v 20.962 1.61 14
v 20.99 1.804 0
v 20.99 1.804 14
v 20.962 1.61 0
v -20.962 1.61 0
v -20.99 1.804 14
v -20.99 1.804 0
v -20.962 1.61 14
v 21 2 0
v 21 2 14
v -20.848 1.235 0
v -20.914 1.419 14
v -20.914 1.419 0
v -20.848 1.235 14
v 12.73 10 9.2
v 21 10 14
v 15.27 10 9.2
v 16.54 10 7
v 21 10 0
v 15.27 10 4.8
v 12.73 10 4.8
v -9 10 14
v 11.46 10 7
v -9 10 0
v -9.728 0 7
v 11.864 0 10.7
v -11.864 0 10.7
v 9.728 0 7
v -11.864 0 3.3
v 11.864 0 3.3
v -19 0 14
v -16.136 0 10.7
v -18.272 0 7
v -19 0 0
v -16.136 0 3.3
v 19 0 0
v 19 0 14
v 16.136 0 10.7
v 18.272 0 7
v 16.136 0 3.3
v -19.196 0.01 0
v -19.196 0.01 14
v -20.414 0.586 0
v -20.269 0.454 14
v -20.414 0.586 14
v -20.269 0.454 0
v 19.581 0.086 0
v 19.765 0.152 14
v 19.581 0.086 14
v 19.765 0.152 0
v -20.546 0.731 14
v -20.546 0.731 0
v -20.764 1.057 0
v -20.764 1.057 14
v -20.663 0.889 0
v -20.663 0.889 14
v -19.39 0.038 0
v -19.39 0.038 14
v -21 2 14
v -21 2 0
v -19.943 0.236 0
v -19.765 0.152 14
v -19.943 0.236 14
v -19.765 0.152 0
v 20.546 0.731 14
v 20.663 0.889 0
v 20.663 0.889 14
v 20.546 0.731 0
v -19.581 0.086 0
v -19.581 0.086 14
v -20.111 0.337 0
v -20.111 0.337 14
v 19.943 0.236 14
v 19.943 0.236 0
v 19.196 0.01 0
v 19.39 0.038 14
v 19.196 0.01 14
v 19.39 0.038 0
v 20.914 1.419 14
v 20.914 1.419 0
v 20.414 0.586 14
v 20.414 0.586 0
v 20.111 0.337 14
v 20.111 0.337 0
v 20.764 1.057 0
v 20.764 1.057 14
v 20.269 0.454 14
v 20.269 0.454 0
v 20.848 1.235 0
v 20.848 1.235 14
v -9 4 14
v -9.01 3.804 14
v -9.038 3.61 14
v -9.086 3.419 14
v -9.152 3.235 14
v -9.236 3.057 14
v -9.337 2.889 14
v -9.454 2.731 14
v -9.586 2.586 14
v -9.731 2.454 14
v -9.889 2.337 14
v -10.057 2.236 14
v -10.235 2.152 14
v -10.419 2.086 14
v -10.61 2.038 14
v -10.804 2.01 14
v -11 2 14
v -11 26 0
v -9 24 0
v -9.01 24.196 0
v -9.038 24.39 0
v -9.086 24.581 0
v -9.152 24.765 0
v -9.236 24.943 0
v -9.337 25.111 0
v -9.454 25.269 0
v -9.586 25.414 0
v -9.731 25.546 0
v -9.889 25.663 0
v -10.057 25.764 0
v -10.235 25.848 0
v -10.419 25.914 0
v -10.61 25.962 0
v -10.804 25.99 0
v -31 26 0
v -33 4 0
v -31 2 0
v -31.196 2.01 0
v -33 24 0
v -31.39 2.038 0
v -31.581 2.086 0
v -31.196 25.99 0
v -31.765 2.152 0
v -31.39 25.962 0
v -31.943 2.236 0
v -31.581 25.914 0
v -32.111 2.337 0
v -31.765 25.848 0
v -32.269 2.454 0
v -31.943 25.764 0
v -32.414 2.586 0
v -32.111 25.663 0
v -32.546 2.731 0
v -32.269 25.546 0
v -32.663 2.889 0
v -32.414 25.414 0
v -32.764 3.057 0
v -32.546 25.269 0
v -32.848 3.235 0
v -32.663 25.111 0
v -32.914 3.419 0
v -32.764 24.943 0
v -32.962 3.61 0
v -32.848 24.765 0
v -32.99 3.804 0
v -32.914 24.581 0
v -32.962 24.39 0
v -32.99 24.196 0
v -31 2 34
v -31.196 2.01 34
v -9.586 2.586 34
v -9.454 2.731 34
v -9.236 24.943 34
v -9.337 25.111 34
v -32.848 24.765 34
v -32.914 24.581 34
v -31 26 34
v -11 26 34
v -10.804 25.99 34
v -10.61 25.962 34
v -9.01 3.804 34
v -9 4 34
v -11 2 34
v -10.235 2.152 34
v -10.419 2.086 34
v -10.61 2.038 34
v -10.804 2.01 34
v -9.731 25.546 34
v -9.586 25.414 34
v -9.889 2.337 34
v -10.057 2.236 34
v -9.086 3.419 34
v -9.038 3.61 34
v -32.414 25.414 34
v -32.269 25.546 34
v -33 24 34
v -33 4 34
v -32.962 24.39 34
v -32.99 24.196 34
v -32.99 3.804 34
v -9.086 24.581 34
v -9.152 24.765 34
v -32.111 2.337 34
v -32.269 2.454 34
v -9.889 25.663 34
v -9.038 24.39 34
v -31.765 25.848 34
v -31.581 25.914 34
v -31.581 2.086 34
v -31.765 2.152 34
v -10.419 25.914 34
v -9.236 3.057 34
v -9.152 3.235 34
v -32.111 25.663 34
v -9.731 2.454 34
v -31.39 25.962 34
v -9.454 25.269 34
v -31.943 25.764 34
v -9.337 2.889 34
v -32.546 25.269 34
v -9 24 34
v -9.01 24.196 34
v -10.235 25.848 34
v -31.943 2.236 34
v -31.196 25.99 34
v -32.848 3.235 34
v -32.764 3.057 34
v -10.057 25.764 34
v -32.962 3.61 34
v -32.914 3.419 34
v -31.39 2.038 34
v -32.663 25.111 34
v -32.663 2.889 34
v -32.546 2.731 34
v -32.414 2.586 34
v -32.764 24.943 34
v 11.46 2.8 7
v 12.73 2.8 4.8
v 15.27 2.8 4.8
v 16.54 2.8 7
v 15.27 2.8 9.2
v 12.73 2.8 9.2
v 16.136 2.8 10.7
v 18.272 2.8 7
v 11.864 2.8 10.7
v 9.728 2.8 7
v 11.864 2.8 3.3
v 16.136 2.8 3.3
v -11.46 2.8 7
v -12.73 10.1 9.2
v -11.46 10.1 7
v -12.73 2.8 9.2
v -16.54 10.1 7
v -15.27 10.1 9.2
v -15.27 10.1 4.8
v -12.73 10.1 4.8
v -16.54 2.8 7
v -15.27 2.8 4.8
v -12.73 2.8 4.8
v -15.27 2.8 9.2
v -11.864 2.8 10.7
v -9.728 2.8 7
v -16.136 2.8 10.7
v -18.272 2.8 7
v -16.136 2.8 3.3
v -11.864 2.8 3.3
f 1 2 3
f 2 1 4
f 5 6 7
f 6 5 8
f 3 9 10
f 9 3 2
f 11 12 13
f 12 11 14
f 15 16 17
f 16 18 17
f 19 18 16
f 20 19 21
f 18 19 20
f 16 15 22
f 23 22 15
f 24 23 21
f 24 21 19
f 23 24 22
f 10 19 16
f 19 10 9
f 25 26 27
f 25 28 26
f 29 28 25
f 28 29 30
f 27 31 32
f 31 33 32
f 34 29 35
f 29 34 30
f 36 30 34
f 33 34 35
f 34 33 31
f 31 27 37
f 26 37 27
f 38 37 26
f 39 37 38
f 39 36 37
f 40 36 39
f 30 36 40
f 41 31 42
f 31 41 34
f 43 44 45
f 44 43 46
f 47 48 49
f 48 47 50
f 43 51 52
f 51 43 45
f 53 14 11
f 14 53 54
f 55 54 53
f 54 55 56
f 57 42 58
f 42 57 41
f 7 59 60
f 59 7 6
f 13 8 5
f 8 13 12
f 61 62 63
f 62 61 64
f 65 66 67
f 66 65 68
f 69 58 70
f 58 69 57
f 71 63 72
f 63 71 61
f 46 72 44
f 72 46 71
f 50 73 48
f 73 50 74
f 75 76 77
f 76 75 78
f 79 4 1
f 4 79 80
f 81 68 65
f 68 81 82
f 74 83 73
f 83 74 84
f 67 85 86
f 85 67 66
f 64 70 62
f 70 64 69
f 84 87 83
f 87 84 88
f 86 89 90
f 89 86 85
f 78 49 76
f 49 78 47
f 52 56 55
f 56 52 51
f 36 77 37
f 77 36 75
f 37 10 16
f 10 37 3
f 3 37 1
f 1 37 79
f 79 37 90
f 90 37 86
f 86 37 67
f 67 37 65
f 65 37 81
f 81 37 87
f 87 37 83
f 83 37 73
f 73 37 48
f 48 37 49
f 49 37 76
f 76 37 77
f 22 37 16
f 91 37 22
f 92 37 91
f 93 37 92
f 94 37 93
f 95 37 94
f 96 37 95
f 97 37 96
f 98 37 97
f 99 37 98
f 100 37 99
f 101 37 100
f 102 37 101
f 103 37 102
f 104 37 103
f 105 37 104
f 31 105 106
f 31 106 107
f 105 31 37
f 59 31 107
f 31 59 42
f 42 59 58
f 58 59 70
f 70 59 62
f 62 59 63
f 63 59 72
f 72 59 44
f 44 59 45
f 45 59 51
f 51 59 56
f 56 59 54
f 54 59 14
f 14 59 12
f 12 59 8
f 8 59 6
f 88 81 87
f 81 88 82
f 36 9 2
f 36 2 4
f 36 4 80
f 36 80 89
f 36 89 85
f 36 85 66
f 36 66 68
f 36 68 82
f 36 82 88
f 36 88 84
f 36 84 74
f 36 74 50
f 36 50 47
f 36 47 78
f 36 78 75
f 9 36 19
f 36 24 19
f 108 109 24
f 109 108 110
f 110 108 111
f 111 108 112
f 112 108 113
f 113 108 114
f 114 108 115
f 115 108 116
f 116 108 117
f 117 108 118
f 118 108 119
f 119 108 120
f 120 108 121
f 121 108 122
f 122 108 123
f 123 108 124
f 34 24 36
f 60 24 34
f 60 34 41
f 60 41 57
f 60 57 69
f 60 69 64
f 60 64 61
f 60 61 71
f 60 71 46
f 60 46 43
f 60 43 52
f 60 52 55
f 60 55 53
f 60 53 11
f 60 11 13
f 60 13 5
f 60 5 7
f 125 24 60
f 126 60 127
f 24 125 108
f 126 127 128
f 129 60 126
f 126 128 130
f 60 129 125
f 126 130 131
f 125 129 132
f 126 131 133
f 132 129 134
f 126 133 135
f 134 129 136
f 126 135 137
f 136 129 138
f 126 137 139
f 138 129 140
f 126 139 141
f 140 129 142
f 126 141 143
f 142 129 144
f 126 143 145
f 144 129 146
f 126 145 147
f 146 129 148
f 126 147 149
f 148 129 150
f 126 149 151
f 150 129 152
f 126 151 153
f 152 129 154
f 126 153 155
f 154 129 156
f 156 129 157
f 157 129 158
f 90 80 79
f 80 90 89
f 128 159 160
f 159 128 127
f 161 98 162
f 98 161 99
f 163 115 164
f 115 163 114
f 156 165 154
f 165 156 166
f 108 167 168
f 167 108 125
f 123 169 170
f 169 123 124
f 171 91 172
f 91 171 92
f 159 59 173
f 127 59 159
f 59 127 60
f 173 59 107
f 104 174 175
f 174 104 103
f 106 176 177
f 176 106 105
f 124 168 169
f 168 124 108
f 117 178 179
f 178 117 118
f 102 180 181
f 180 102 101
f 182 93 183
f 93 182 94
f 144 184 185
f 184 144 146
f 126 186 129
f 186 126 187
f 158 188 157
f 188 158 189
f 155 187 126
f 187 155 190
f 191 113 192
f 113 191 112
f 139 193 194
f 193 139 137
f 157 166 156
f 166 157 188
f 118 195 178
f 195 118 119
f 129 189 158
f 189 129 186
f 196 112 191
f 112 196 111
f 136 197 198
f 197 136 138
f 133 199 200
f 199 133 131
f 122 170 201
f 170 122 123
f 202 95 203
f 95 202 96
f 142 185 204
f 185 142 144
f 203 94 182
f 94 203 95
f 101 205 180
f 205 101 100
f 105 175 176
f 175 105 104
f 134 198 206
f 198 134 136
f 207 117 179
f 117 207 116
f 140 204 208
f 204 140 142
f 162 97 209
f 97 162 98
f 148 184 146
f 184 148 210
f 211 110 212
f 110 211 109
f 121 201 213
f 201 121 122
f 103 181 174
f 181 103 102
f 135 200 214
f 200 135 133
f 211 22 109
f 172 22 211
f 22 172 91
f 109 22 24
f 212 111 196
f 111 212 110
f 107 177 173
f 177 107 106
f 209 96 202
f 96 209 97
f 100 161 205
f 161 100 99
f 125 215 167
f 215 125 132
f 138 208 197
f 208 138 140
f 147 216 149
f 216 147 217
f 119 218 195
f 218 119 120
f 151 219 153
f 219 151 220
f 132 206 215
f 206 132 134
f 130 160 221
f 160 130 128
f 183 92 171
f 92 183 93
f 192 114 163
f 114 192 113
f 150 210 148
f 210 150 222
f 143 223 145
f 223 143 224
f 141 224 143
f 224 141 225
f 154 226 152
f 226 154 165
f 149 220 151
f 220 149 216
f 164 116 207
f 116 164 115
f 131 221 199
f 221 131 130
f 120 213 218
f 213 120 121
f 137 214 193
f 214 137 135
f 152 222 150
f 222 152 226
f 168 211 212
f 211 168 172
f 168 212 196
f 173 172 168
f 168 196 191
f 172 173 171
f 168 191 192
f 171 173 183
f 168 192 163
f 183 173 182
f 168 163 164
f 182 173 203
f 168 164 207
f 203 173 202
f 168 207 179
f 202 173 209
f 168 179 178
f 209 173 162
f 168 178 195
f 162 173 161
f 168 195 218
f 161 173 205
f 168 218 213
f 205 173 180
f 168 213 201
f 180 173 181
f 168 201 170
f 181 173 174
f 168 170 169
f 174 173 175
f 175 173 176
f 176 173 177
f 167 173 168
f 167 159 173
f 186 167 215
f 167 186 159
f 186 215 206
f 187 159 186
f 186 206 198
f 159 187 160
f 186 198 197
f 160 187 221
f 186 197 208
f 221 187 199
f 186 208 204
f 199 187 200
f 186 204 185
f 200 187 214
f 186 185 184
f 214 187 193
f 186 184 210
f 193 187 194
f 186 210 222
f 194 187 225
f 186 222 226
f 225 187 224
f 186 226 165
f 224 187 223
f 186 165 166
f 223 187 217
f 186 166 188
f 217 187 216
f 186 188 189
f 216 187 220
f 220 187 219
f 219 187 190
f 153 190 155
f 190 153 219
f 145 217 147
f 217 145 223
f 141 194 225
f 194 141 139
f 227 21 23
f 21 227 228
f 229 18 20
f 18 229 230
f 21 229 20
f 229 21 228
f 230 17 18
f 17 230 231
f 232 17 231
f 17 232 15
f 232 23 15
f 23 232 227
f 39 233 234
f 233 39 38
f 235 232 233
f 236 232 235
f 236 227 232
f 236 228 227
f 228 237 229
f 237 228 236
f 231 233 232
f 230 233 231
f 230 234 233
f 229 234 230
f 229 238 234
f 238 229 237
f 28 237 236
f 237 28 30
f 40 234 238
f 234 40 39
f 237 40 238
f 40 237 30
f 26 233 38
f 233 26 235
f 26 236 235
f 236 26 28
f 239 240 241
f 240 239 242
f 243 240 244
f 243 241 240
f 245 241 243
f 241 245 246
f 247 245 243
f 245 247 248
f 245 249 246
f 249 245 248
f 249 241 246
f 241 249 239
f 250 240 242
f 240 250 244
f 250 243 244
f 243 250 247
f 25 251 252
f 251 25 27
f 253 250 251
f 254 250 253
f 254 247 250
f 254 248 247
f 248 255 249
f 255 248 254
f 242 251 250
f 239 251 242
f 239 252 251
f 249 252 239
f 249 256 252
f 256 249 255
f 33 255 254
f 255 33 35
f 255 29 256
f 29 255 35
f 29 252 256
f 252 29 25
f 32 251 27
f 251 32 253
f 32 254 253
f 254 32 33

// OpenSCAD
// file: ../../../modules/steel_rack.scad
use <bolts.scad>;

bolt_edge_offset = 15;
bolt_positions = [
  bolt_edge_offset,
  bolt_edge_offset + 98,
  bolt_edge_offset + 98 + 24,
];

module bolt_and_nut(y, h) {
  nut_thickness = 5;
  translate([0, y, h / 2])
    m6_bolt_hole(h + 1, center = true);
  translate([0, y, h - nut_thickness / 2])
    rotate([0, 0, 90])
    m6_nut_trap(nut_thickness, center = true);
}

module long_bar(w, y, h) {
  difference() {
    translate([w / 2, y / 2, h / 2])
      cube([w, y, h], center = true);

    for (x = bolt_positions) {
      translate([x, 0, 0])
        bolt_and_nut(y / 2, h);
    }
  }
}

module short_bar(w, y, h) {
  difference() {
    translate([w / 2, y / 2, h / 2])
      cube([w, y, h], center = true);

    translate([bolt_positions[0], 0, 0])
      bolt_and_nut(y / 2, h);
  }
}

module fillet_profile(r, h) {
  linear_extrude(height = h, center = true)
    difference() {
      square([r, r]);
      circle(r = r, $fn = 64);
    }
}
// file: ../../../modules/bolts.scad
module nut_trap(d, h, center = true) {
  linear_extrude(height = h, center = center)
  circle(d = d / cos(30), $fn = 6);
}

module bolt_hole(d, h, center = true) {
  linear_extrude(height = h, center = center)
  circle(d = d, $fn = 64);
}

// Hex holes for self-tapping (nominal - 0.2mm)
module hex_hole(flat_d, h) {
  linear_extrude(height = h, center = true)
  circle(d = flat_d / cos(30), $fn = 6);
}

module m3_bolt_hexhole(h) {
  rotate([0, 0, 90]) hex_hole(flat_d = 2.8, h = h);
}

module m4_bolt_hexhole(h) {
  rotate([0, 0, 90]) hex_hole(flat_d = 3.8, h = h);
}

module m6_bolt_hexhole(h) {
  rotate([0, 0, 90]) hex_hole(flat_d = 5.8, h = h);
}

module m8_bolt_hexhole(h) {
  rotate([0, 0, 90]) hex_hole(flat_d = 7.8, h = h);
}

// M3
module m3_bolt_hole(h, center = false) { bolt_hole(d = 3.4, h = h, center = center); }
module m3_nut_trap(h, center = false) { nut_trap(d = 5.7, h = h, center = center); }

// M4
module m4_bolt_hole(h, center = false) { bolt_hole(d = 4.4, h = h, center = center); }
module m4_nut_trap(h, center = false) { nut_trap(d = 7.5, h = h, center = center); }

// M6
module m6_bolt_hole(h, center = false) { bolt_hole(d = 6.2, h = h, center = center); }
module m6_nut_trap(h, center = false) { nut_trap(d = 10.2, h = h, center = center); }

// M8
module m8_bolt_hole(h, center = false) { bolt_hole(d = 8.4, h = h, center = center); }
module m8_nut_trap(h, center = false) { nut_trap(d = 13.3, h = h, center = center); }
// file: ../../../modules/slide_rail_outer_bracket.scad
use <bolts.scad>
use <steel_rack.scad>

// スライドレール外側とL字アングルを接合するL字ブラケット。
// 設計の経緯と確定値は ledger/designs/steel-rack-500x400.md が正本。
//
// 座標系 (部品自身の datum):
//   X = 0 がこの部品側のL字アングル外側面。部品はアングル板厚の内側から始まる
//   Y = 0 がスライドレール外側面。+Y がラック外側
//   Z = 0 が部品底面 (レール下端と一致)
// front は screw_x = [37, 101.5]、rear は [79.5, 176] を自分の datum
// から渡す。 M6 が高さ 22.5±12 の対称配置のため部品は Z 反転対称になり、
// 左右のレールにも上下反転するだけで同じ2部品を使い回せる。

bracket_height = 45;
flange_t = 10; // 短辺 (X方向厚) の厚さ
// 長辺 (Y方向厚) の厚さ。旧断面は flange_t=10 を共用していたが、レール面を
// rail_offset 分外へ出すと M6 ナット挿入口が長辺と重なるため 2mm 削った
// (10→8、user決定)。ナット六角の内縁 (y=8.000) と長辺外面がツライチになる
arm_t = 8;
// レール接触面のラック外側オフセット。組付け実測でレール間隔が 385mm しか
// なくケース 412mm が入らないため、(412 - 385) / 2 + 0.5 = 14mm ずつ
// 各レールを外側へ移す (user指示)。M6 実穴は既に開いており位置を変えられない
rail_offset = 14;
inner_r = 4;
m6_z = [ 10.5, 34.5 ];
// クリアランス基準: 呼び寸法 + 0.4mm (実プリントの嵌合結果から拡大)
m6_pass_flat = 6.4; // M6ボルト通し六角の二面幅 (手前5mm)
m6_nut_flat = 10.4; // M6ナット窪み六角の二面幅 (奥5mm、ナット実測9.8 + 実効0.6)
m6_stage_depth = 5;
screw_z = 22.5;
m4_pass_flat = 4.4; // M4小トラスネジ通し六角の二面幅
m4_nut_flat = 7.4; // M4ナット窪み六角の二面幅 (ナット実測6.8 + 実効0.6)
m4_nut_depth = 2.8; // M4ナット窪みの深さ (user指定)
edge_margin = 8; // 穴の外縁から部品端までの余白 (自由な辺のみ)
angle_t = 2.2; // L字アングルの板厚

// 六角プリズム: 軸X・上下の辺が水平 (flat-up)。
// 天井を短い水平ブリッジにして垂れの改善を狙う
// (point-up だと天井面が水平から30°になり垂れた — 嵌合試験で確認済み)
module
hex_x_flat_up(flat_d, l)
{
    rotate([ 0, 90, 0 ]) rotate([ 0, 0, 90 ]) hex_hole(flat_d = flat_d, h = l);
}

// 六角プリズム: 軸Y・上下の辺が水平 (flat-up)。M6と同じくブリッジ天井
module
hex_y_flat_up(flat_d, l)
{
    rotate([ 90, 0, 0 ]) hex_hole(flat_d = flat_d, h = l);
}

module
slide_rail_outer_bracket(screw_x, name = "bracket")
{
    // flat-up配置では水平方向の穴半径は対角/2 (= 二面幅/(2*cos30))。
    // 8mm余白の契約はこの実半径に対して守る
    m6_nut_diag = m6_nut_flat / cos(30);
    m4_nut_diag = m4_nut_flat / cos(30);
    // M6中心: 実物のアングルには旧断面 (長辺厚10) の導出値
    // (厚10 + 内側R + 余白 + M6六角対角/2 = 28.0044) で既に穴が開いている。
    // 旧導出式から rail_offset を引くことで M6 実穴と部品外端の絶対位置を
    // 保ったまま、レール接触面 (y=0) だけをラック外側へ 14mm 出す
    m6_y = flange_t + inner_r + edge_margin + m6_nut_diag / 2 - rail_offset;
    short_len = m6_y + m6_nut_diag / 2 + edge_margin;
    // 長辺のX終端: 最奥のM4穴の最大断面 (ナット窪みの対角の半分) + 余白
    arm_end = max(screw_x) + m4_nut_diag / 2 + edge_margin;

    echo(str("CONTRACT ", name, ": height = ", bracket_height));
    echo(str("CONTRACT ", name, ": flange_t = ", flange_t));
    echo(str("CONTRACT ", name, ": arm_t = ", arm_t));
    echo(str("CONTRACT ", name, ": rail_offset = ", rail_offset));
    echo(str("CONTRACT ", name, ": inner_r = ", inner_r));
    echo(str("CONTRACT ", name, ": m6_z = ", m6_z));
    echo(str("CONTRACT ", name, ": m6_pass_flat = ", m6_pass_flat));
    echo(str("CONTRACT ", name, ": m6_nut_flat = ", m6_nut_flat));
    echo(str("CONTRACT ", name, ": screw_z = ", screw_z));
    echo(str("CONTRACT ", name, ": m4_pass_flat = ", m4_pass_flat));
    echo(str("CONTRACT ", name, ": m4_nut_flat = ", m4_nut_flat));
    echo(str("CONTRACT ", name, ": m4_nut_depth = ", m4_nut_depth));
    echo(str("CONTRACT ", name, ": edge_margin = ", edge_margin));
    echo(str("CONTRACT ", name, ": angle_t = ", angle_t));
    echo(str("CONTRACT ", name, ": screw_x = ", screw_x));
    echo(str("CONTRACT ",
             name,
             ": m6_y = ",
             m6_y,
             ", short_len = ",
             short_len,
             ", arm_end = ",
             arm_end));

    // 余白の契約 (自由な辺のみ。高さ45とM6のZはuser固定値なので対象外)。
    // M6ナット六角の内縁 (m6_y - 対角/2 = 8.000) は長辺外面 (y = arm_t) と
    // ツライチで、ナット挿入口が長辺に塞がれない (1e-9 は浮動小数の丸め猶予)
    assert(m6_y - m6_nut_diag / 2 >= arm_t - 1e-9,
           "M6 nut slot is blocked by the arm");
    assert(short_len - (m6_y + m6_nut_diag / 2) >= edge_margin,
           "M6 hole too close to the short-flange edge");
    assert(arm_end - (max(screw_x) + m4_nut_diag / 2) >= edge_margin,
           "M4 hole too close to the arm end");
    assert(min(screw_x) - m4_nut_diag / 2 >= angle_t + flange_t,
           "M4 hole overlaps the short flange");

    difference()
    {
        union()
        {
            // 短辺: アングル内側に当たる縦板 (M6で締結)
            translate([ angle_t, 0, 0 ])
                cube([ flange_t, short_len, bracket_height ]);

            // 長辺: レール外側面に当たる横板 (M4小トラスネジ+ナットで締結)
            translate([ angle_t, 0, 0 ])
                cube([ arm_end - angle_t, arm_t, bracket_height ]);

            // 内側コーナーのR4フィレット (応力集中の回避)
            translate([
                angle_t + flange_t + inner_r,
                arm_t + inner_r,
                bracket_height / 2
            ]) rotate([ 0, 0, 180 ]) fillet_profile(inner_r, bracket_height);
        }

        // M6の2段六角穴 (軸X・flat-up): 手前5mmが通し、奥5mmがナット窪み。
        // ナット窪みは +X へ延長した挿入回廊 (x=7.2..17): 短辺の背面から
        // fillet の掛かる区間を局所カットし、fillet 外端 (x=16.2) を 0.8mm
        // 超えて開放することで M6 ナットを +X 側から真っ直ぐ挿入できる
        // (fillet と挿入経路の干渉分を削るのは user 許容)。
        // 六角の下頂点 (y=8.000) は長辺外面とツライチで、正確な接触は
        // 退化した稜 (非多様体STL) を作るため、hull で 0.2mm 下へ掃引して
        // 長辺外面に浅い逃げ溝を彫る (ナットの嵌合には影響しない)
        slot_start = angle_t + flange_t - m6_stage_depth;
        slot_end = angle_t + flange_t + inner_r + 0.8;
        slot_relief = 0.2;
        for (z = m6_z) {
            translate([ angle_t + m6_stage_depth / 2 - 0.05, m6_y, z ])
                hex_x_flat_up(m6_pass_flat, m6_stage_depth + 0.1);
            translate([ (slot_start + slot_end) / 2, m6_y, z ]) hull()
            {
                hex_x_flat_up(m6_nut_flat, slot_end - slot_start);
                translate([ 0, -slot_relief, 0 ])
                    hex_x_flat_up(m6_nut_flat, slot_end - slot_start);
            }
        }

        // M4小トラスネジの穴 (軸Y・flat-up):
        // 通しは全厚を貫通し、L字の内側面 (y=8) から深さ2.8mmのナット窪み。
        // ネジはレール内側から刺さり
        // (トラス頭はスライダーと干渉しない実測済み)、
        // ナットが窪みの底で受けてレール板とブラケットを共締めする
        for (x = screw_x) {
            translate([ x, arm_t / 2, screw_z ])
                hex_y_flat_up(m4_pass_flat, arm_t + 0.2);
            translate([ x, arm_t - m4_nut_depth / 2 + 0.05, screw_z ])
                hex_y_flat_up(m4_nut_flat, m4_nut_depth + 0.1);
        }
    }
}
// file: ../../../modules/slide_rail_inner_block.scad
use <slide_rail_outer_bracket.scad>

// スライドレール内側とオープンフレームケースを繋ぐ支持部品の共通形状。
// 設計の経緯と確定値は ledger/designs/steel-rack-500x400.md が正本。
//
// 座標系 (部品自身の datum):
//   X = レール方向。M4 2穴の中点 (ブロック中心) が 0
//   Y = 0 がスライドレール(内)の接触面。+Y がラック中央 (ケース) 向き
//   Z = 0 がブロック底面
// レール(内)は高さ24.4mmで、そのド真ん中 (12.2mm) に横穴が28mm間隔で並ぶ。
// ブロックは穴中心 (部品 z = 7) で取り付くため、下端はレール下端から
// 約5.2mm浮く。ブロックの脇に立つ24×24の柱でケースを浮かせて受ける。
//
// 印刷向き: ブロックを底面 (z=0) でビルドプレートへ置く。M4軸は水平になり、
// 六角穴はすべて flat-up (天井が短い水平ブリッジ) で外側ブラケットと揃う。
// 柱もブロックと同じ z=0 から立ち上がってビルドプレートへ接地する
// (張り出した柱を宙に浮かせるとプリント成功率が著しく落ちる。userの判断)。

block_len = 42; // X: 穴間28 + 14
// Y: M4×10 がケース側から通し7.2 + 窪み2.8 でナットへ全掛かりする厚さ。
// 旧14mmは対応する長さのM4ネジが無くナットに届かなかった (実物確認)
block_depth = 10;
block_height = 14; // Z
m4_dx = 14;        // ブロック中心から各M4穴まで (間隔28)
m4_z = 7; // ブロック中心の高さ。レール横穴の12.2mmに合わせて付く
// クリアランス基準は外側ブラケットの実績値をそのまま流用する
// (呼び寸法+0.4 / ナットは実測+実効0.6。2026-08-14のuser指示)
m4_pass_flat = 4.4; // M4小トラスネジ通し六角の二面幅
m4_nut_flat = 7.4; // M4ナット窪み六角の二面幅 (ナット実測6.8 + 実効0.6)
m4_nut_depth = 2.8; // M4ナット窪みの深さ
// 柱の一辺 (24×24)。旧10×10ではケース四隅のネジ穴に落ち込んで支持に
// ならなかったため、穴を跨げる24へ広げた (2026-08-16の実物フィードバック)
standoff = 24;
standoff_height = 34; // 柱の全高 = ブロック14 + 上へ20突出
// 柱をレール接触面 (y=0) から離す量。実物合わせで「スライドレールから
// 突起を多少離す必要がある」と判明したため導入した暫定値で、現物合わせ
// 予定 (2026-08-15のuserフィードバック)
standoff_setback = 2;
// 垂直エッジのフィレット半径。角柱の角が刺さって痛いため落とす (user指示)。
// 上下の水平エッジはプリント難度が飛躍的に上がるため未加工 = 3D の
// minkowski ではなく 2D 輪郭を linear_extrude して垂直エッジだけ丸める
corner_r = 2;
arc_fn = 64; // 円弧の分割数 (このリポジトリの既存慣行)

// 四隅を r で丸めた矩形の2D輪郭 (原点が左下・X方向 w・Y方向 d)
module
rounded_rect_2d(w, d, r)
{
    translate([ r, r ]) offset(r = r, $fn = arc_fn)
        square([ w - 2 * r, d - 2 * r ]);
}

// 土台の2D輪郭: ナット側 (y=0) の2隅だけ r で落とし、ケース側 (y=d) は
// 直角のまま残す (落とすのはナット側だけ、というuser指示)
module
block_profile_2d(w, d, r)
{
    union()
    {
        rounded_rect_2d(w, d, r);
        translate([ 0, r ]) square([ w, d - r ]);
    }
}

// standoff_offset: 柱の中心をブロック中心からずらす量 (X)。
// 対称型は 0 で X 鏡像不変になり、奥用はケース端との2mm逃げから +21。
// 導出 (ケース端の datum を持つのは entry 側) は各 entry のコメントを参照
module
slide_rail_inner_block(standoff_offset = 0, name = "inner")
{
    // flat-up配置では水平方向の穴半径は対角/2 (= 二面幅/(2*cos30))
    m4_nut_diag = m4_nut_flat / cos(30);

    echo(str("CONTRACT ",
             name,
             ": block = ",
             [ block_len, block_depth, block_height ]));
    echo(str("CONTRACT ", name, ": m4_x = ", [ -m4_dx, m4_dx ]));
    echo(str("CONTRACT ", name, ": m4_z = ", m4_z));
    echo(str("CONTRACT ", name, ": m4_pass_flat = ", m4_pass_flat));
    echo(str("CONTRACT ", name, ": m4_nut_flat = ", m4_nut_flat));
    echo(str("CONTRACT ", name, ": m4_nut_depth = ", m4_nut_depth));
    echo(str("CONTRACT ", name, ": standoff_offset = ", standoff_offset));
    echo(str("CONTRACT ",
             name,
             ": standoff = ",
             [ standoff, standoff, standoff_height ]));
    echo(str("CONTRACT ", name, ": standoff_setback = ", standoff_setback));
    echo(str("CONTRACT ", name, ": corner_r = ", corner_r));

    // 柱は土台より大きく、X も Y もはみ出す。接合が成立するのは
    // 重なり幅で、フィレットで削れる分 (両端 corner_r) を超えて正であること
    x_overlap = min(block_len / 2, standoff_offset + standoff / 2) -
                max(-block_len / 2, standoff_offset - standoff / 2);
    y_overlap = min(block_depth, standoff_setback + standoff) -
                max(0, standoff_setback);

    // 穴と窪みがブロックに収まる契約 (1e-9 は浮動小数の丸め猶予)
    assert(m4_dx + m4_nut_diag / 2 <= block_len / 2 + 1e-9,
           "M4 nut pocket runs past the block end");
    assert(m4_z - m4_nut_flat / 2 >= -1e-9 &&
               m4_z + m4_nut_flat / 2 <= block_height + 1e-9,
           "M4 nut pocket runs past the block top/bottom");
    assert(m4_nut_depth < block_depth,
           "M4 nut pocket is deeper than the block");
    // 柱と土台の接合契約: 重なりがフィレット2つ分より広く残ること
    assert(x_overlap >= 2 * corner_r, "standoff and block barely overlap in X");
    assert(y_overlap >= 2 * corner_r, "standoff and block barely overlap in Y");
    // 柱がレール接触面 (y=0) より手前へ出ない契約
    assert(standoff_setback >= 0, "standoff crosses the rail face");
    // フィレットが各接触寸法を食い尽くさない契約
    assert(2 * corner_r <= min(standoff, block_depth, block_len),
           "corner_r is too large for the block/standoff profiles");

    difference()
    {
        union()
        {
            // ネジ穴ブロック: レール(内)の側面へ当てて共締めする本体。
            // 垂直エッジのうちナット側の2本だけ R (2D輪郭を押し出す)
            translate([ -block_len / 2, 0, 0 ])
                linear_extrude(height = block_height)
                    block_profile_2d(block_len, block_depth, corner_r);

            // スタンドオフ: ケースを浮かせて受ける柱。レール接触面から
            // standoff_setback だけ離して z=0 から立て、ブロックより20mm
            // 高く、ブロックの背面より16mmケース側へ張り出す。
            // 垂直エッジは四隅とも R
            translate([ standoff_offset - standoff / 2, standoff_setback, 0 ])
                linear_extrude(height = standoff_height)
                    rounded_rect_2d(standoff, standoff, corner_r);
        }

        // M4小トラスネジの穴 (軸Y・flat-up): 通し二面幅4.4が全厚を貫通し、
        // レール接触面 (y=0) 側に深さ2.8mmのナット窪みが開く。ナットを
        // 窪みへ入れてからレールへ当てるとレール板が背中を押さえるので
        // 脱落せず、ネジはケース側 (y=10の面) から刺して締める。締結は
        // ナットとレール板の圧接 + シャンクのせん断で受ける
        for (x = [ -m4_dx, m4_dx ]) {
            translate([ x, block_depth / 2, m4_z ])
                hex_y_flat_up(m4_pass_flat, block_depth + 0.2);
            translate([ x, m4_nut_depth / 2 - 0.05, m4_z ])
                hex_y_flat_up(m4_nut_flat, m4_nut_depth + 0.1);
        }
    }
}
// main file
use <../../../modules/slide_rail_inner_block.scad>

// スライドレール内側のケース支持部品 (奥用・ラック手前から見て右)。
// slide_rail_inner_rear_l.scad の mirror([1,0,0]) (X鏡像) そのもの。
// 対称型 (slide_rail_inner_support.scad) は柱がブロック中心にあり鏡像不変
// なので左右で共用できるが、奥用は柱の偏心が X 対称性を破るため、
// L/R が真の鏡像対になり2設計に分かれる。
//
// datum と向きの規約は鏡像前 (rear_l) と同じ: X=0 は奥ペアの中点、
// 部品ローカル +X = ラック手前方向。鏡像後の実位置では柱は -X 側に寄る。

// 偏心は rear_l と同じ値 (導出: ケース端39 + 逃げ2 + 柱の半分12 - 奥ペア中点32)
standoff_offset = 21;

mirror([ 1, 0, 0 ]) slide_rail_inner_block(standoff_offset = standoff_offset,
                                           name = "inner_rear_r");

// module は鏡像前の値を echo するため、鏡像後の実位置を自分で宣言する
echo(str("CONTRACT inner_rear_r: standoff_offset_mirrored = ",
         -standoff_offset));
